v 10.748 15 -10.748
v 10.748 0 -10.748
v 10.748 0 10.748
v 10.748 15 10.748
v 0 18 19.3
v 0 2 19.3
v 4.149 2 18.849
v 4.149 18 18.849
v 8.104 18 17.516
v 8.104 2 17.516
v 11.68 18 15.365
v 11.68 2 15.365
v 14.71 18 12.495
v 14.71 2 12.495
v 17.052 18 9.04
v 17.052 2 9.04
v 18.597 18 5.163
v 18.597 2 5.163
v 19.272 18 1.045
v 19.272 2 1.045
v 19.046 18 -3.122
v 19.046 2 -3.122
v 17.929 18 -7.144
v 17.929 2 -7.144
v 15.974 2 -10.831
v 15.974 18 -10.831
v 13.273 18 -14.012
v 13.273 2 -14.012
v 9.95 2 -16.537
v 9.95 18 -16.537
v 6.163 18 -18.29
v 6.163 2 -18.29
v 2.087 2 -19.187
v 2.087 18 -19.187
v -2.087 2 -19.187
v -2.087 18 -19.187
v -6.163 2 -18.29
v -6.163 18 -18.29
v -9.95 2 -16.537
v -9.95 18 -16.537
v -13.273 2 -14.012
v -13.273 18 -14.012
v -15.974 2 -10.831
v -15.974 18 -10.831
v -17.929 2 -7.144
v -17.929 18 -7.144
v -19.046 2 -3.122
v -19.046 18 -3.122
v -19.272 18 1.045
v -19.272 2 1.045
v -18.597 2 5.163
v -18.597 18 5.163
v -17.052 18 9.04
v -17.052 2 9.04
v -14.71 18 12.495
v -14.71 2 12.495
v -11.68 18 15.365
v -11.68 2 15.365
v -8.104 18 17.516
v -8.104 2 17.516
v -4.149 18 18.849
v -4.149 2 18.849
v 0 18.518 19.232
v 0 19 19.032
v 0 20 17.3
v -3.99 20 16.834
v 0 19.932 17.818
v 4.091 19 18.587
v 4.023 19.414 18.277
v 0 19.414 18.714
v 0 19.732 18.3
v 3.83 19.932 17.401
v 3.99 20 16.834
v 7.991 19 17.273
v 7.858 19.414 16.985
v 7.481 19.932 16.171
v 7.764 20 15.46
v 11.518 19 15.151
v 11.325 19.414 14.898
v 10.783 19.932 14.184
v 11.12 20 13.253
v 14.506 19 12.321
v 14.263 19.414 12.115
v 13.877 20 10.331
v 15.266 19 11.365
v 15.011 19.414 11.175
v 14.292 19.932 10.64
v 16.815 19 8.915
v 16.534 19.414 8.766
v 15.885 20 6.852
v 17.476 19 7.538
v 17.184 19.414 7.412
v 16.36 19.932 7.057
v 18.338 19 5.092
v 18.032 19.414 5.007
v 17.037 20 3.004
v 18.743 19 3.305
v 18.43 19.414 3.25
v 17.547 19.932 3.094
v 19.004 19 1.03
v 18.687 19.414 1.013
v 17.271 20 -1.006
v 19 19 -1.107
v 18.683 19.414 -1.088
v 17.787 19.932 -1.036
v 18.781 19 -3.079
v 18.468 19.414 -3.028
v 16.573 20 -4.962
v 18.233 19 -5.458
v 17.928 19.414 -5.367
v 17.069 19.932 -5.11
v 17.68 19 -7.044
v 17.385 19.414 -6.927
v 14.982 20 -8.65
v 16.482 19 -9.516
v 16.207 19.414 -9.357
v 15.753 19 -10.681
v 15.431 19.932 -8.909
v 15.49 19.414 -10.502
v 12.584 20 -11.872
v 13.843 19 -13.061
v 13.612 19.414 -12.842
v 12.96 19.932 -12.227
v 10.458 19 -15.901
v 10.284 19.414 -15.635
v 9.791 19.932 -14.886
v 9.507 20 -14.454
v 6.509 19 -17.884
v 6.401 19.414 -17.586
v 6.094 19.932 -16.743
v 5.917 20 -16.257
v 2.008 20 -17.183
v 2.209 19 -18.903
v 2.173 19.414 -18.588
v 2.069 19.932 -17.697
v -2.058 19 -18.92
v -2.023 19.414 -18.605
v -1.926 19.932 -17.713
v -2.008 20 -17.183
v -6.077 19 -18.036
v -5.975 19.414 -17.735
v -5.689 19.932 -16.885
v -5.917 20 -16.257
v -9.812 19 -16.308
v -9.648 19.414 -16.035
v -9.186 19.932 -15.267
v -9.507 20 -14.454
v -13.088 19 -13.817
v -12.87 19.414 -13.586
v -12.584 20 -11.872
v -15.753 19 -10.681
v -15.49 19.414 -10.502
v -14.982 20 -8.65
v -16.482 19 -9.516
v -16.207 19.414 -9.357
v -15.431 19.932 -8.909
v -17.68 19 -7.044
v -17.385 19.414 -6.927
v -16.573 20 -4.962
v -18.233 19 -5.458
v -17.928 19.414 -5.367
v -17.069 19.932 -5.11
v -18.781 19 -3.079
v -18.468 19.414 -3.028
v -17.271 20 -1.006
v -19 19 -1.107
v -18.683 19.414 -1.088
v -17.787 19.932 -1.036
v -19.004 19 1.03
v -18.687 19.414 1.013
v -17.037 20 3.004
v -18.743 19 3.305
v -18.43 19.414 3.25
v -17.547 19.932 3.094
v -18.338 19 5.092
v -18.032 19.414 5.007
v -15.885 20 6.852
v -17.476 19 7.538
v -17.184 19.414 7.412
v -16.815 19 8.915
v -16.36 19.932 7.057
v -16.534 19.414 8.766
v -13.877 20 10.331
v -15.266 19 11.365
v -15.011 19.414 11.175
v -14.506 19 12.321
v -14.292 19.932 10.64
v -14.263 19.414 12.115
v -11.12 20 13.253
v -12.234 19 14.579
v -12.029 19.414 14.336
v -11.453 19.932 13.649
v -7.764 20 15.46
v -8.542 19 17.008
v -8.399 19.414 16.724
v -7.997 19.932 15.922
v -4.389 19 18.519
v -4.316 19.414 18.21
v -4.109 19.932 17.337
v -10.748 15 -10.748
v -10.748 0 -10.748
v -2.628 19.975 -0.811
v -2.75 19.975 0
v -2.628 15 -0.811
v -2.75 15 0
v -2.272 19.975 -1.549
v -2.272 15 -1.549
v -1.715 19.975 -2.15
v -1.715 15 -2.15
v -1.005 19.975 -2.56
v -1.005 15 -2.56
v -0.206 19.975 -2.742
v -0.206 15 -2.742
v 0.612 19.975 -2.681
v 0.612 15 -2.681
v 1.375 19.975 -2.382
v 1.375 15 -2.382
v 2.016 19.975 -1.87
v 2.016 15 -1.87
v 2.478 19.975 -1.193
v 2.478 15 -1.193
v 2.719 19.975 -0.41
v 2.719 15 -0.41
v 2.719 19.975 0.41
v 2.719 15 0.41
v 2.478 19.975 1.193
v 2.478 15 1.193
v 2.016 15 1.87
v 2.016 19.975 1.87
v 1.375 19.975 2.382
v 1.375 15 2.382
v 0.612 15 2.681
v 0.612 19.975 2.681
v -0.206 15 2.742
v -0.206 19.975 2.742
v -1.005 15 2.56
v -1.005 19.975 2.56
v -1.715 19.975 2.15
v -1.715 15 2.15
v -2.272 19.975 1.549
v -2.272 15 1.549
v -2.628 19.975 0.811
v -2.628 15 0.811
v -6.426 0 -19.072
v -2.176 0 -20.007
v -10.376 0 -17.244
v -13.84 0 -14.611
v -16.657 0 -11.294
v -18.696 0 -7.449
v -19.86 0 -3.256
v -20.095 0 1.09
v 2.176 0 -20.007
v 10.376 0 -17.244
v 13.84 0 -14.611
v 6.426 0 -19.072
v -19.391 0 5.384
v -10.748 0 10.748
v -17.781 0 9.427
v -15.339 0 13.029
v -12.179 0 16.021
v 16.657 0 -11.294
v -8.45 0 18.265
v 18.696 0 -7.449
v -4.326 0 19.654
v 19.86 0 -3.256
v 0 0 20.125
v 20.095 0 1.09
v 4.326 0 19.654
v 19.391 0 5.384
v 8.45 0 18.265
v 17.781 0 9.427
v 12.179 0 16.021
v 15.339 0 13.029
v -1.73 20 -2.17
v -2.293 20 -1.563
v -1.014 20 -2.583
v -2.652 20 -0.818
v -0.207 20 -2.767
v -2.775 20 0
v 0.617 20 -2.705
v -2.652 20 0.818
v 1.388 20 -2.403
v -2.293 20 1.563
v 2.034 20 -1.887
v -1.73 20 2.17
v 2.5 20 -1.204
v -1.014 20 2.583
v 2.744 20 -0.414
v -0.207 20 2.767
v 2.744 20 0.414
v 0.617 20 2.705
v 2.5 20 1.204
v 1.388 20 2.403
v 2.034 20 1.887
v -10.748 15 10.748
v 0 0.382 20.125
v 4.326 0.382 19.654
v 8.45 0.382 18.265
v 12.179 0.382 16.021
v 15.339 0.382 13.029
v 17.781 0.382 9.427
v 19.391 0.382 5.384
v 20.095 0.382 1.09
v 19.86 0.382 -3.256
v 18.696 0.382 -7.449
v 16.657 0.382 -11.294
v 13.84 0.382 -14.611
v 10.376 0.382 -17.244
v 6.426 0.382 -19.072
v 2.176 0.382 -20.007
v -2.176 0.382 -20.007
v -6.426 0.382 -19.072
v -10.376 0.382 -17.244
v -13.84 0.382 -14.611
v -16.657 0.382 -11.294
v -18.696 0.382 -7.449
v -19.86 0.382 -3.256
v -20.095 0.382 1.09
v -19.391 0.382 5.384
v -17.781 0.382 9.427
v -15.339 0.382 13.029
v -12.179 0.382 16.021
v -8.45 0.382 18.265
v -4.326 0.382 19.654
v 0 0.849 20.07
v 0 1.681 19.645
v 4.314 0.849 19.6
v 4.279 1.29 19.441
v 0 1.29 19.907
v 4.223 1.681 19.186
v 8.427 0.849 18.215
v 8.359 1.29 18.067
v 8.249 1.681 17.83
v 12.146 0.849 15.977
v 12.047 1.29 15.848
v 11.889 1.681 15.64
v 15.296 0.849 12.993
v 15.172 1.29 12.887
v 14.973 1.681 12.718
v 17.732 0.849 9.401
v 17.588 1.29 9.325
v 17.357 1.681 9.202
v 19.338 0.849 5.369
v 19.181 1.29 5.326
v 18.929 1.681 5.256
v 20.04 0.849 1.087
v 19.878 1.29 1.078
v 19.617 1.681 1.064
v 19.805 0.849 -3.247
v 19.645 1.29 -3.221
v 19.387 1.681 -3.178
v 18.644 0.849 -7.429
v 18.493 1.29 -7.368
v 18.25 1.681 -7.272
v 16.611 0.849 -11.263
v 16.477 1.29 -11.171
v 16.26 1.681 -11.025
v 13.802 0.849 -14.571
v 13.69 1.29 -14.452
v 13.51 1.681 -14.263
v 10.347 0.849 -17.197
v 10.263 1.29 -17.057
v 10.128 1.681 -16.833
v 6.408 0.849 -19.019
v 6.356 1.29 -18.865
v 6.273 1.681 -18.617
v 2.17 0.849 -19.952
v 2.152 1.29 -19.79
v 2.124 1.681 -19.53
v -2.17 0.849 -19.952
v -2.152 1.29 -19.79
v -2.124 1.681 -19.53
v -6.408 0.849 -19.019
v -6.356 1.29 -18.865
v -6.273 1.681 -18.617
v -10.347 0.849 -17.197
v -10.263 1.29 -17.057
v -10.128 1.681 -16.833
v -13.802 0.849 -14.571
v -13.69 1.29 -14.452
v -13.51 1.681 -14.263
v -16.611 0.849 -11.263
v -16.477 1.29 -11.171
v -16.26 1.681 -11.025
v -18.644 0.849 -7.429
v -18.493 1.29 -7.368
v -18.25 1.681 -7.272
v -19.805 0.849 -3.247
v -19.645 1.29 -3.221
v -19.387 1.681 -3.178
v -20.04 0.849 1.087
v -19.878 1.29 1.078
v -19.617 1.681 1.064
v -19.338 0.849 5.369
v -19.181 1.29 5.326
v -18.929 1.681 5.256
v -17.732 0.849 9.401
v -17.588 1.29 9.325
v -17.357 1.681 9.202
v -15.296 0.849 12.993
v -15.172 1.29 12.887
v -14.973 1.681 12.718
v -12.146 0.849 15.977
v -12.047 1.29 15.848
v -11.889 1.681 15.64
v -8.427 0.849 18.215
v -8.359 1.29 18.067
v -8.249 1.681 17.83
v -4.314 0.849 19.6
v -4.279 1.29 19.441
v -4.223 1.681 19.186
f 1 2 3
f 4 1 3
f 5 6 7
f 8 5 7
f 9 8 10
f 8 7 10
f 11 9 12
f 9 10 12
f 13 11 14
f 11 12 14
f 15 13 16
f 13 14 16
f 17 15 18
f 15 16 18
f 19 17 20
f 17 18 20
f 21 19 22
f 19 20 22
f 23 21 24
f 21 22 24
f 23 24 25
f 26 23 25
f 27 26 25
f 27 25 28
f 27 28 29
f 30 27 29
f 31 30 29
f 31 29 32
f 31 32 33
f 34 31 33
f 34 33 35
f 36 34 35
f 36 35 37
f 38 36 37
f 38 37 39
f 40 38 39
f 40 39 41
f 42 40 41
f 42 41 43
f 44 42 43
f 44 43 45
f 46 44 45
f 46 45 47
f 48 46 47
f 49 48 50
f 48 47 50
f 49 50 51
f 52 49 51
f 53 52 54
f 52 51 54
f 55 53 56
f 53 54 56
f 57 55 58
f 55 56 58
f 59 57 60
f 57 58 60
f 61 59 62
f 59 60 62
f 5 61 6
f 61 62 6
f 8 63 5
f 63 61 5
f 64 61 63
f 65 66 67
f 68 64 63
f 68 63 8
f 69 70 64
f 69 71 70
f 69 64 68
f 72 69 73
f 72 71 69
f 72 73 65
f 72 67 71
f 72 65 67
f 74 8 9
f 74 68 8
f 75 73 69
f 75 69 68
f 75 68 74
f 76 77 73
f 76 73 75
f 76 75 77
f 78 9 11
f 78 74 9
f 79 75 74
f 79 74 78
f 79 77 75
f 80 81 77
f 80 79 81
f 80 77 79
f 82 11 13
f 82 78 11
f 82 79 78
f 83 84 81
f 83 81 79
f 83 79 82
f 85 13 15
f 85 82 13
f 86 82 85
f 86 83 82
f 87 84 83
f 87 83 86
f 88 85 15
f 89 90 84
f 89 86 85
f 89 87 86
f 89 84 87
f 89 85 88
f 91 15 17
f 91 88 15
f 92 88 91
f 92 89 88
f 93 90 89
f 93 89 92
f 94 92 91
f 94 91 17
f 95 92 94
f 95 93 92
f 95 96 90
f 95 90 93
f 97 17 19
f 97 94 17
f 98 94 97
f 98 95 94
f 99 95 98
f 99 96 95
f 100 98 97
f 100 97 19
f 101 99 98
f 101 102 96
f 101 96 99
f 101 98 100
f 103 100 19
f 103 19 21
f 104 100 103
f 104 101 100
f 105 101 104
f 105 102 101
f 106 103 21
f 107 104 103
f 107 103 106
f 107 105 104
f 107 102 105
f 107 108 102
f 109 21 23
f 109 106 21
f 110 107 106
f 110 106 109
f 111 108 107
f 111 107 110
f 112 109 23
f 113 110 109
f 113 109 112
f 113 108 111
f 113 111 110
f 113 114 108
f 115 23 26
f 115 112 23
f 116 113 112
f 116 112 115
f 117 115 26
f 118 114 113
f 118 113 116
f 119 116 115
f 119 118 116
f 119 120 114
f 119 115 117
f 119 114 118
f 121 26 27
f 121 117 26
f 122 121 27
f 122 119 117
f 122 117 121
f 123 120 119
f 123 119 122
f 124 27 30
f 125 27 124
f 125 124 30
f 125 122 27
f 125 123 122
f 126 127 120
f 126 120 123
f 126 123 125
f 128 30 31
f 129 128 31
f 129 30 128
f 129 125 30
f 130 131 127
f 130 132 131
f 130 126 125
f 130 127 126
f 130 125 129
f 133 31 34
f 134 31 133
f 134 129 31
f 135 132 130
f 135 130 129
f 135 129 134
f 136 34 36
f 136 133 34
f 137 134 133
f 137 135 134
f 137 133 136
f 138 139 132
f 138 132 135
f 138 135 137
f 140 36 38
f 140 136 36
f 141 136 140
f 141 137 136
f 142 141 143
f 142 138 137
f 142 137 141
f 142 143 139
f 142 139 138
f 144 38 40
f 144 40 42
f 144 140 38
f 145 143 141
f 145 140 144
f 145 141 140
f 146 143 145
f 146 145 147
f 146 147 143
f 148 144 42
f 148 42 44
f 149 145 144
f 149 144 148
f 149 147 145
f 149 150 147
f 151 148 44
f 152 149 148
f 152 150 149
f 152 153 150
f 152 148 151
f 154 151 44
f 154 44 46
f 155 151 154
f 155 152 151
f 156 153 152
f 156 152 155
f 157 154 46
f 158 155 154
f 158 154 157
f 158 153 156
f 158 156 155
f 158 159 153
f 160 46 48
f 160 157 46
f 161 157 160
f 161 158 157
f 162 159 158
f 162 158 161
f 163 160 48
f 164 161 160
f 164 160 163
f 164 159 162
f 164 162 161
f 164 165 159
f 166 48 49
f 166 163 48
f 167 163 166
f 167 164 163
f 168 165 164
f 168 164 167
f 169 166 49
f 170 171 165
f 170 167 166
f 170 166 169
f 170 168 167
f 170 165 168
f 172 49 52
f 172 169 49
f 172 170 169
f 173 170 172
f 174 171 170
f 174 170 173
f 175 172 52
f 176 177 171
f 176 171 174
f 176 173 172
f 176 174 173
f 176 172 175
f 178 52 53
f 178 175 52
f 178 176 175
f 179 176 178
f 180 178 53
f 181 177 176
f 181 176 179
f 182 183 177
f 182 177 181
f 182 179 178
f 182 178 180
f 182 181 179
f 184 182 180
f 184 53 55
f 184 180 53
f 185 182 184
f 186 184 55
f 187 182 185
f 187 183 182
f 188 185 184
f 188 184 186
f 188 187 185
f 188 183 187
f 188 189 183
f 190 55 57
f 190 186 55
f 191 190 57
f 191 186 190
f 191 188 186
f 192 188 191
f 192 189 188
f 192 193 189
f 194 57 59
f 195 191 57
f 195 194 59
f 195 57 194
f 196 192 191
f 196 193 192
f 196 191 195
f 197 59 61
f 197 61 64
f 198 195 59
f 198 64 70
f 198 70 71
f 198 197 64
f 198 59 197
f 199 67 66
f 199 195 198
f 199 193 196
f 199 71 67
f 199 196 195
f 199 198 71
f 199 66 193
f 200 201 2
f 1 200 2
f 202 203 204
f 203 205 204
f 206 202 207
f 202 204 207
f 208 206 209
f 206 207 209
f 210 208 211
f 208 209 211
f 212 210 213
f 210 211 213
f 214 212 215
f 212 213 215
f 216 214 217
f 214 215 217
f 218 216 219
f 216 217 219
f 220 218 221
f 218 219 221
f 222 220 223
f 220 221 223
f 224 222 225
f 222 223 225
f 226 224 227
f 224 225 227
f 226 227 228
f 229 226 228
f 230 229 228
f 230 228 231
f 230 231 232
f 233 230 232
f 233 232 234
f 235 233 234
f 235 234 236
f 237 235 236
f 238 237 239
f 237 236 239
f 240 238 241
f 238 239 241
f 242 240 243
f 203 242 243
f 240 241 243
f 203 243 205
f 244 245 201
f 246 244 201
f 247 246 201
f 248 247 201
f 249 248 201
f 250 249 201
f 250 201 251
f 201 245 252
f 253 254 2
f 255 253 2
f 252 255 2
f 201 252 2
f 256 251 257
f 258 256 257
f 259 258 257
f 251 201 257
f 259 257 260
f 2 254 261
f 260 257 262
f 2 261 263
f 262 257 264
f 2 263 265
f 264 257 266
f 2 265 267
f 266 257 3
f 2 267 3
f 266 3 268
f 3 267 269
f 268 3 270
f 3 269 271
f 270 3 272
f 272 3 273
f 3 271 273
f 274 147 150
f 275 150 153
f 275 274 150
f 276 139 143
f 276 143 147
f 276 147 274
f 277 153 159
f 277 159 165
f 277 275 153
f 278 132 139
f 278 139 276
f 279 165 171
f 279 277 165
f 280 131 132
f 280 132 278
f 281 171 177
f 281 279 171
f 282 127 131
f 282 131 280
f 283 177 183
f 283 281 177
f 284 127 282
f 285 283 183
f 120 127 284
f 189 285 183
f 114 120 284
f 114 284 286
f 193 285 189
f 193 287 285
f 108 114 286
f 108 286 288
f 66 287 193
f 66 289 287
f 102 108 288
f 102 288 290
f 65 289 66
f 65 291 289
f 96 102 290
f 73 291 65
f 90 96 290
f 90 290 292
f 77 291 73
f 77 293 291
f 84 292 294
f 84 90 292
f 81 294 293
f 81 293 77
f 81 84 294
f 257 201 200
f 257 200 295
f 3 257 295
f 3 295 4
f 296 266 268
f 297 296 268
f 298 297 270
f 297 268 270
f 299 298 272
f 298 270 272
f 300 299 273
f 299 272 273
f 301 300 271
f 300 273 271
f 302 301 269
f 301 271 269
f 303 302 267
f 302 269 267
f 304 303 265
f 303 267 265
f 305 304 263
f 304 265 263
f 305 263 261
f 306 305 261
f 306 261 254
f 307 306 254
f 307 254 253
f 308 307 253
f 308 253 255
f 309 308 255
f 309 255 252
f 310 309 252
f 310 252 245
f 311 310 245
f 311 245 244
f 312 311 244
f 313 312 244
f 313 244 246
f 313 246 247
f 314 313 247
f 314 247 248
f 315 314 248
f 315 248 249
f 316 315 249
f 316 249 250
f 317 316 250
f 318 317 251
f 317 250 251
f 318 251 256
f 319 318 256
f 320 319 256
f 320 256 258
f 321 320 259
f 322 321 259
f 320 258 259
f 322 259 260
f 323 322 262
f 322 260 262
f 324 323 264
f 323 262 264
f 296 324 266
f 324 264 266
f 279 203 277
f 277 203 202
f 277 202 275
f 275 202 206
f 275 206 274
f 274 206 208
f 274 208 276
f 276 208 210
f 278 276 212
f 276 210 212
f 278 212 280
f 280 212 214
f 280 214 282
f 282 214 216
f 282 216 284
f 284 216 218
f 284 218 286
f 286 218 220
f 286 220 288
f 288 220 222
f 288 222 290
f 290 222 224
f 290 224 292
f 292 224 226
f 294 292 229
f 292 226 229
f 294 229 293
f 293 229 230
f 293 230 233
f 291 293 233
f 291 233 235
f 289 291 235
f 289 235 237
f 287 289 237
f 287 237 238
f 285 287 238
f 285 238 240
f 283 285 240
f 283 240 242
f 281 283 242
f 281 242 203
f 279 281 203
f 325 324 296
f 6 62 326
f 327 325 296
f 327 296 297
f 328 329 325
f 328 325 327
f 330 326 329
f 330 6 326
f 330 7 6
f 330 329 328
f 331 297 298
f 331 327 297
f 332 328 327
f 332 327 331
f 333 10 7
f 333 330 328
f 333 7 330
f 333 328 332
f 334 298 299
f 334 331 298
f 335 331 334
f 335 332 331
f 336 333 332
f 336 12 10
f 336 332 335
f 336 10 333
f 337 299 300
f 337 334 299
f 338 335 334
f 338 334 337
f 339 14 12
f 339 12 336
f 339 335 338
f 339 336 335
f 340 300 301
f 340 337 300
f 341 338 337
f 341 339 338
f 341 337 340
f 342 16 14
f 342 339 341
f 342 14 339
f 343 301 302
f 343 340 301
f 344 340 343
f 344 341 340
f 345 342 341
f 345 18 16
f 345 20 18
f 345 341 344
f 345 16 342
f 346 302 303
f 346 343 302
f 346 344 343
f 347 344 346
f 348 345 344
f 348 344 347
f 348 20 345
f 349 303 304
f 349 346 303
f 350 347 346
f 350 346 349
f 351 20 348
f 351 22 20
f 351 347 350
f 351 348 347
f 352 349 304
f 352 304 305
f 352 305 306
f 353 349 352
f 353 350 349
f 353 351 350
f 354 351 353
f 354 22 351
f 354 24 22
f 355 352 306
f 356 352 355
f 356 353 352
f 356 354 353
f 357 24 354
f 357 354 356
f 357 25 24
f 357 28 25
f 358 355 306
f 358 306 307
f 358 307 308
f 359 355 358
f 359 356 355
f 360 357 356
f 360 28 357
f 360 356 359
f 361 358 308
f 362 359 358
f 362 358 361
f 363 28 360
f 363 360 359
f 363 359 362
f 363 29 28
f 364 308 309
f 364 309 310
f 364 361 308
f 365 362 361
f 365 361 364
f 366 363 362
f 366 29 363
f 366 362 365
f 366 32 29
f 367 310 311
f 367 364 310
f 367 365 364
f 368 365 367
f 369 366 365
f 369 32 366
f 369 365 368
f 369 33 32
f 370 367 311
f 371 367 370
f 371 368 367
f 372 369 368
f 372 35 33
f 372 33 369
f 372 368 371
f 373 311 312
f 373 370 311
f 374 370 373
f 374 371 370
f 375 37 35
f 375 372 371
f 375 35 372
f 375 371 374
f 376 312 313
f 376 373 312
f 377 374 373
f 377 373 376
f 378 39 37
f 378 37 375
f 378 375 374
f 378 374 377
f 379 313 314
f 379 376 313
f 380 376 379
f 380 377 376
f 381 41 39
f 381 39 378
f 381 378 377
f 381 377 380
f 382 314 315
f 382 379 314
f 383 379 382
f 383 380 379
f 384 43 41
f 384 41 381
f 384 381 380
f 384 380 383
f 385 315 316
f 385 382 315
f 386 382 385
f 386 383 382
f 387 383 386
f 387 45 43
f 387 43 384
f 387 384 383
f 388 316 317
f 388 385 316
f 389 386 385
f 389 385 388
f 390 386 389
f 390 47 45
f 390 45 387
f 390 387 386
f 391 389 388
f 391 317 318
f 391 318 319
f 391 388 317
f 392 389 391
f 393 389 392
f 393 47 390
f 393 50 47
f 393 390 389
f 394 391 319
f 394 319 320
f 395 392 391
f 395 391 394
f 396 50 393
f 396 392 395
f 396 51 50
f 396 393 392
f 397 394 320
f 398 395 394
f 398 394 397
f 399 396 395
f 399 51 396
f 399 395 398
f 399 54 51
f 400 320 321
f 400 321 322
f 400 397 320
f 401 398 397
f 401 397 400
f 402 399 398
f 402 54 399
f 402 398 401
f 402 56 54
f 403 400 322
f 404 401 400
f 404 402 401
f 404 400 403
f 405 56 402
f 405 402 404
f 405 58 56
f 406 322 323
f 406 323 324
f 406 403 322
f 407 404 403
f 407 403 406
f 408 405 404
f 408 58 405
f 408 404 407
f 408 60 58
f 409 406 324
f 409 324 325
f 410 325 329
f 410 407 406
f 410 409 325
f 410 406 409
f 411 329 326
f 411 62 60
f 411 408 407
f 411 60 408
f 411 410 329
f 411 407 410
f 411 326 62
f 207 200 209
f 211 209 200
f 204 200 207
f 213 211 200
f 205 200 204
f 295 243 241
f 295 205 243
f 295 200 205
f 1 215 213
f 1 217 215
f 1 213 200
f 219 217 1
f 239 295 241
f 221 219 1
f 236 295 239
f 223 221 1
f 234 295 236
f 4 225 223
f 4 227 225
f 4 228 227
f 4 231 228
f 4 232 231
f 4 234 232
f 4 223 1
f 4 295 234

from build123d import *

# Parameters (mm, degrees)
SKETCH1_R                      = 20.125
BOSS_EXTRUDE1_DEPTH            = 20
SKETCH12_W                     = 21.496046148
SKETCH12_H                     = 21.496046148
CUT_EXTRUDE1_DEPTH             = 15
CUT_EXTRUDE2_START             = -18
SKETCH16_R                     = 20.125
SKETCH16_R_2                   = 19.3
CUT_EXTRUDE2_DEPTH             = 18
FILLET3_R                      = 2
M5_CLEARANCE_HOLE1_D           = 5.5
M5_CLEARANCE_HOLE1_CSINK_D     = 5.55
M5_CLEARANCE_HOLE1_CSINK_ANGLE = 90


with BuildPart() as part:
    # Sketch1 → Boss-Extrude1 (new body)
    with BuildSketch(Plane(origin=(0, 0, 0), x_dir=(1, 0, 0), z_dir=(0, 1, 0))):
        with Locations(Location((0, 0, 0), (0, 0, 270))):
            Circle(SKETCH1_R)
    extrude(amount=BOSS_EXTRUDE1_DEPTH)

    # Sketch12 → Cut-Extrude1 (cut)
    with BuildSketch(Plane.XZ):
        Rectangle(SKETCH12_W, SKETCH12_H)
    extrude(amount=-CUT_EXTRUDE1_DEPTH, mode=Mode.SUBTRACT)

    # Sketch16 → Cut-Extrude2 (cut)
    with BuildSketch(Plane(origin=(0, 20, 0), x_dir=(1, 0, 0), z_dir=(0, 1, 0)).offset(CUT_EXTRUDE2_START)):
        with Locations(Location((0, 0, 0), (0, 0, 270))):
            Circle(SKETCH16_R)
        with Locations(Location((0, 0, 0), (0, 0, 270))):
            Circle(SKETCH16_R_2, mode=Mode.SUBTRACT)
    extrude(amount=CUT_EXTRUDE2_DEPTH, mode=Mode.SUBTRACT)

    # Fillet3
    # the kernel refuses this fillet: 2 mm, written as the material it takes off along each edge
    with BuildSketch(Plane(origin=(0, 20, 0), x_dir=(0, 0, 1), z_dir=(-1, 0, 0))) as fillet3_piece_1:
        with BuildLine():
            CenterArc((19.3 - FILLET3_R, -FILLET3_R), FILLET3_R, 0, 90)
            Line((19.3 - FILLET3_R, 0), (19.3 - FILLET3_R, FILLET3_R * 0.02))
            Line((19.3 - FILLET3_R, FILLET3_R * 0.02), (19.3 + FILLET3_R * 0.02, FILLET3_R * 0.02))
            Line((19.3 + FILLET3_R * 0.02, FILLET3_R * 0.02), (19.3 + FILLET3_R * 0.02, -FILLET3_R))
            Line((19.3 + FILLET3_R * 0.02, -FILLET3_R), (19.3, -FILLET3_R))
        make_face()
    revolve(axis=Axis((0, 20, 0), (0, 1, 0)), mode=Mode.SUBTRACT)
    with BuildSketch(Plane(origin=(0, 2, 0), x_dir=(0, 0, 1), z_dir=(-1, 0, 0))) as fillet3_piece_2:
        with BuildLine():
            CenterArc((18.125, -1.618448331), FILLET3_R, 0, 54.020199403)
            Line((19.3, 0), (19.3235, 0.032368967))
            ThreePointArc((19.3235, 0.032368967), (19.7125, 0.04), (20.125, 0.04))
            Line((20.125, 0.04), (20.165, 0))
            Line((20.165, 0), (20.165, -1.618448331))
            Line((20.165, -1.618448331), (20.125, -1.618448331))
        make_face()
    revolve(axis=Axis((0, 2, 0), (0, 1, 0)), mode=Mode.SUBTRACT)

    # M5 Clearance Hole1 (through all)
    with Locations(Plane(origin=(0, 20, 0), x_dir=(1, 0, 0), z_dir=(0, 1, 0))):
        with Locations((0, 0)):
            CounterSinkHole(M5_CLEARANCE_HOLE1_D / 2, M5_CLEARANCE_HOLE1_CSINK_D / 2, counter_sink_angle=M5_CLEARANCE_HOLE1_CSINK_ANGLE)


solid = part.part
